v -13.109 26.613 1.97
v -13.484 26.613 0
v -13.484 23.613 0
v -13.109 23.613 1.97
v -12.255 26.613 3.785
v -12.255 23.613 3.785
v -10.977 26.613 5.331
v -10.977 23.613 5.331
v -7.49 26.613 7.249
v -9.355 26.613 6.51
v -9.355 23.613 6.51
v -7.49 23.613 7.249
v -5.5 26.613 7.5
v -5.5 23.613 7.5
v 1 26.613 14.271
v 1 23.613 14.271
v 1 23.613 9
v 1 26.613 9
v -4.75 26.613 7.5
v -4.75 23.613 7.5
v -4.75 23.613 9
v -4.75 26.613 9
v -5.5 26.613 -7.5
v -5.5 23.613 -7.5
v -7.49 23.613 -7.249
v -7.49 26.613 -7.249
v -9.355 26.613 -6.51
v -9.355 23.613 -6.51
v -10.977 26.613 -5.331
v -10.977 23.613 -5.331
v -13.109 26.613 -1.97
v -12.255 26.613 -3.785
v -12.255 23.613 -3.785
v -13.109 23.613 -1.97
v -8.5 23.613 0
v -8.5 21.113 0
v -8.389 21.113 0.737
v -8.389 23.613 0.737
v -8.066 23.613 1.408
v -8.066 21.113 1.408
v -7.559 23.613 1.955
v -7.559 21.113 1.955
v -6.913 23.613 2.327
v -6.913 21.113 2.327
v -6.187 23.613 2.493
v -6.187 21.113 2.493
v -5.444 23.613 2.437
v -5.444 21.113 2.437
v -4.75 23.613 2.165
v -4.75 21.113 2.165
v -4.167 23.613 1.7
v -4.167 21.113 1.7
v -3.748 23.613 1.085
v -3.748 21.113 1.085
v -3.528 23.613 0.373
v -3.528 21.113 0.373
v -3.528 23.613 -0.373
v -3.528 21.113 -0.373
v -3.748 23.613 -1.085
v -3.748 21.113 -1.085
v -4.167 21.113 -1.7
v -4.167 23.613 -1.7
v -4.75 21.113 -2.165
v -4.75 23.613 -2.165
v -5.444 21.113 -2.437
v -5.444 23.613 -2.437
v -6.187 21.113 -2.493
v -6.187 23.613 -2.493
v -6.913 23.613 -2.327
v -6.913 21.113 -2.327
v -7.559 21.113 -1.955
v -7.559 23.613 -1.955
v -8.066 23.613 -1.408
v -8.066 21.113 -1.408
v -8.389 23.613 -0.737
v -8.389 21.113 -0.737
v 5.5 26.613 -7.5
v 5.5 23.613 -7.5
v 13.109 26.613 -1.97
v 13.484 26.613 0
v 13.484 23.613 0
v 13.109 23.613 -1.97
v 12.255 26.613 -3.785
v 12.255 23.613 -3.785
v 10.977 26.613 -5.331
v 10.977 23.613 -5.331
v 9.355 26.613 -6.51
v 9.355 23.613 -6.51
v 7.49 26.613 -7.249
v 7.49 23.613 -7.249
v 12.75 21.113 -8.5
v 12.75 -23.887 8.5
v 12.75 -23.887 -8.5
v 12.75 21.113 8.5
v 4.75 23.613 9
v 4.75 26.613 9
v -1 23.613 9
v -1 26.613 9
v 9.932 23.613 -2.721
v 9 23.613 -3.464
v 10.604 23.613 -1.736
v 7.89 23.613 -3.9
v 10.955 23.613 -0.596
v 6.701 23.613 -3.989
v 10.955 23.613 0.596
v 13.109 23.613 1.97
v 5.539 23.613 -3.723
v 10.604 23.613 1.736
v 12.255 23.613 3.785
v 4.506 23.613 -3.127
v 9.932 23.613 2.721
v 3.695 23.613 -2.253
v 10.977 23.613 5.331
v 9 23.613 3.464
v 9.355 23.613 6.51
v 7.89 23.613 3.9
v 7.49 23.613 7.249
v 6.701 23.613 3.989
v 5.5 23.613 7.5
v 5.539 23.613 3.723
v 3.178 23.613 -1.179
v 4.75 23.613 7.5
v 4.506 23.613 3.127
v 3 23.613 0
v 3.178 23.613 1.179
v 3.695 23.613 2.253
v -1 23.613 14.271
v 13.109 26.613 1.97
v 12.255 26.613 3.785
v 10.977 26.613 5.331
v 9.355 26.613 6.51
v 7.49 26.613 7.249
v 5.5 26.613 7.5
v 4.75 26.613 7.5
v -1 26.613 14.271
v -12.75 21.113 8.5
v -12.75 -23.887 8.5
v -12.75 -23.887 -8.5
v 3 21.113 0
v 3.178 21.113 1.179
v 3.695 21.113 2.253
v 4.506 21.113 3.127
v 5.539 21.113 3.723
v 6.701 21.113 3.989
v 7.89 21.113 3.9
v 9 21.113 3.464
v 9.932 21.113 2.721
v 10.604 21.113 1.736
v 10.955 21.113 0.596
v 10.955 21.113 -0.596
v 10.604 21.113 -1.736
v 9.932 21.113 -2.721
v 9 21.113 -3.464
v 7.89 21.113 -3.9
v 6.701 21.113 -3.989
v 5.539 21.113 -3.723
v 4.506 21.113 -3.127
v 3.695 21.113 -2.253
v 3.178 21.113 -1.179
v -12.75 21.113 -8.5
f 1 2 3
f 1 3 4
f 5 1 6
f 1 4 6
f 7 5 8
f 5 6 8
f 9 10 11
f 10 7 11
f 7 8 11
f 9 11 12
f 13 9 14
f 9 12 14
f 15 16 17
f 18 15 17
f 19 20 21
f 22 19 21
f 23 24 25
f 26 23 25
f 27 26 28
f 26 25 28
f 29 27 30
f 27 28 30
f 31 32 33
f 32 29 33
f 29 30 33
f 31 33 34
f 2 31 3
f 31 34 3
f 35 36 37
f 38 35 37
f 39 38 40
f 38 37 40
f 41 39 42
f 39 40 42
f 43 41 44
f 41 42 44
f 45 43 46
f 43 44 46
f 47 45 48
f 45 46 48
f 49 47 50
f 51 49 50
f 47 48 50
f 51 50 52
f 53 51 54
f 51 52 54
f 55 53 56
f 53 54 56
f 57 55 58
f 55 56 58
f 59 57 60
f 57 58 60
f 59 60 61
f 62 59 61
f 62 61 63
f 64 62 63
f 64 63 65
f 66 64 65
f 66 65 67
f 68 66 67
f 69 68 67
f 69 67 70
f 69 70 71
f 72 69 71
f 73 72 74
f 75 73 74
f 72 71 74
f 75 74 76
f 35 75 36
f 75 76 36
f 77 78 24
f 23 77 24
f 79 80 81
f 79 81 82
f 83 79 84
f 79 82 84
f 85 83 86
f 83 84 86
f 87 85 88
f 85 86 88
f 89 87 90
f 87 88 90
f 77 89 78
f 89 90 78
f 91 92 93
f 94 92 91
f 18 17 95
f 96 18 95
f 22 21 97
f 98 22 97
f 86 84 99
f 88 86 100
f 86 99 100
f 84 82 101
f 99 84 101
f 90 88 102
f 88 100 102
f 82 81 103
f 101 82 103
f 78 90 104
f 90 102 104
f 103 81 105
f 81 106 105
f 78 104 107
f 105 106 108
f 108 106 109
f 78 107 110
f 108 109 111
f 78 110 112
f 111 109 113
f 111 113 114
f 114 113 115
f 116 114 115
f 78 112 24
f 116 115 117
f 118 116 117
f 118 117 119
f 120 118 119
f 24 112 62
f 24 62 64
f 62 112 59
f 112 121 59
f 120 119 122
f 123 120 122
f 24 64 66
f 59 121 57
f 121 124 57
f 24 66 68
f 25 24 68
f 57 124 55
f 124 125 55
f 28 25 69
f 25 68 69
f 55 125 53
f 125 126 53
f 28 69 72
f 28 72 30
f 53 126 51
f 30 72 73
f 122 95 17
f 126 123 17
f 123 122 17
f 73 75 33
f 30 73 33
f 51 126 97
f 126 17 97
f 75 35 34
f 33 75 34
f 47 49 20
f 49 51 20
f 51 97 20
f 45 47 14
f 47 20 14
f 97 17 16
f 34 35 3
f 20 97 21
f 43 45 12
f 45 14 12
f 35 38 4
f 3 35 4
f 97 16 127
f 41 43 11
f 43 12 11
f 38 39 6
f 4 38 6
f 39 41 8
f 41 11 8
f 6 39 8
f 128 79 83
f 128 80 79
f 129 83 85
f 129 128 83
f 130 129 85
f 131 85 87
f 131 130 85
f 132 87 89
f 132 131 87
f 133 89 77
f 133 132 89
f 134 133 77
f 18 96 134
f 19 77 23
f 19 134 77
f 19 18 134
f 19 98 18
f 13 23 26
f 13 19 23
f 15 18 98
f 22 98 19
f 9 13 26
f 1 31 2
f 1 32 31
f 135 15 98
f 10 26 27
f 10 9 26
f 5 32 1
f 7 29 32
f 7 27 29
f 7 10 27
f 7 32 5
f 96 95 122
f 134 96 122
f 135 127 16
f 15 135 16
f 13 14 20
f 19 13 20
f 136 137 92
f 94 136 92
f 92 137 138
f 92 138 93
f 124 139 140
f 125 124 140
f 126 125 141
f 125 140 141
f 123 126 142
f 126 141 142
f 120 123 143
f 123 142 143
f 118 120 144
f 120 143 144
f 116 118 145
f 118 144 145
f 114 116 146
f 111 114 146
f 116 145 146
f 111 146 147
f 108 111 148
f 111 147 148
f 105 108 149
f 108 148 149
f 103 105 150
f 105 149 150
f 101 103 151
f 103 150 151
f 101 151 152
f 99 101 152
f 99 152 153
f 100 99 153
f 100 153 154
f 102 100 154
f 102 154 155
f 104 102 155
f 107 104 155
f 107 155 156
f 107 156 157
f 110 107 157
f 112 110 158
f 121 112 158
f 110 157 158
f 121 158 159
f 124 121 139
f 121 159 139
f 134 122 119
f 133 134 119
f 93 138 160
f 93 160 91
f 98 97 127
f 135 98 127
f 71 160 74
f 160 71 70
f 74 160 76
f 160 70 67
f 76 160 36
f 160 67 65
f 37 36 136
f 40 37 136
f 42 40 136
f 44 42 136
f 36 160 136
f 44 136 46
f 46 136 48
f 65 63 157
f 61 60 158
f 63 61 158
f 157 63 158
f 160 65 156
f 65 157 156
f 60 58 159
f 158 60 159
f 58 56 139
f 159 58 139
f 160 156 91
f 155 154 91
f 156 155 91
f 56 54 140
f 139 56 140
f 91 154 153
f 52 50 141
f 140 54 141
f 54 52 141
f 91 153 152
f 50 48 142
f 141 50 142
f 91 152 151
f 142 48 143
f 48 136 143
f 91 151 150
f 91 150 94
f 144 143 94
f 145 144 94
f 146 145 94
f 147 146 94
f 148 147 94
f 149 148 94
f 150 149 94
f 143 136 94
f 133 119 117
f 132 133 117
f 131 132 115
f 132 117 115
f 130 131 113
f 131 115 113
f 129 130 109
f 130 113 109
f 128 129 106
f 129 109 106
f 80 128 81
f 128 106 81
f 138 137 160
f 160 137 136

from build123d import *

# Parameters (mm, degrees)
F0_W         = 25.5
F0_H         = 45
F1_DEPTH     = 8.5
F2_R         = 2.5
F2_R_2       = 4
F3_DEPTH     = 2.5
F5_DEPTH     = 3
F6_T4_DEPTH  = 43
F6_T9_DEPTH  = 43
F6_T14_DEPTH = 43
F6_T19_DEPTH = 43


# Not quite as in the source:
# - a fillet or chamfer that OpenCascade refuses, or shapes differently, is made with other operations: its cross-section is extruded or revolved along the edge and cut away or added


with BuildPart() as f1:
    # F0 (on Top) → F1 (new body, symmetric)
    with BuildSketch(Plane.XY):
        with Locations((0, -1.3867942244)):
            Rectangle(F0_W, F0_H)
    extrude(amount=F1_DEPTH, both=True)

    # F2 (on face) → F3 (join)
    with BuildSketch(Plane(origin=(0, 21.1132057756, 0), x_dir=(-1, 0, 0), z_dir=(0, 1, 0))):
        with Locations((6, 0)):
            Circle(F2_R)
        with Locations((-7, 0)):
            Circle(F2_R_2)
    extrude(amount=F3_DEPTH)

    # F4 (on face) → F5 (join)
    with BuildSketch(Plane(origin=(0, 23.6132057756, 0), x_dir=(-1, 0, 0), z_dir=(0, 1, 0))):
        Polygon((-4.75, 7.5), (-13.5, 7.5), (-13.5, -7.5), (13.5, -7.5), (13.5, 7.5), (4.75, 7.5), (4.75, 9), (1, 9), (1, 14.2706949264), (-1, 14.2706949264), (-1, 9), (-4.75, 9), align=None)
    extrude(amount=F5_DEPTH)

    # F6: fillet of radius 8 on 4 edges, made by hand


with BuildPart() as f6_tool2:
    # F6_s3 → F6_t4 (new body)
    with BuildSketch(Plane.XZ.offset(-3.6132057756)):
        with BuildLine():
            ThreePointArc((5.5, 7.5), (11.1568542495, 5.1568542495), (13.5, -0.5))
            Line((13.5, -0.5), (13.5, 7.5))
            Line((13.5, 7.5), (5.5, 7.5))
        make_face()
    extrude(amount=-F6_T4_DEPTH)

    split(bisect_by=Plane.XZ.offset(-21.1132057756), keep=Keep.BOTTOM)


with BuildPart() as f1_1:
    add(f1.part)

    # F6_t1: cut F6_tool2
    add(f6_tool2.part, mode=Mode.SUBTRACT)


with BuildPart() as f6_tool7:
    # F6_s8 → F6_t9 (new body)
    with BuildSketch(Plane.XZ.offset(-3.6132057756)):
        with BuildLine():
            ThreePointArc((-13.5, -0.5), (-11.1568542495, 5.1568542495), (-5.5, 7.5))
            Line((-5.5, 7.5), (-13.5, 7.5))
            Line((-13.5, 7.5), (-13.5, -0.5))
        make_face()
    extrude(amount=-F6_T9_DEPTH)

    split(bisect_by=Plane.XZ.offset(-21.1132057756), keep=Keep.BOTTOM)


with BuildPart() as f1_2:
    add(f1_1.part)

    # F6_t6: cut F6_tool7
    add(f6_tool7.part, mode=Mode.SUBTRACT)


with BuildPart() as f6_tool12:
    # F6_s13 → F6_t14 (new body)
    with BuildSketch(Plane.XZ.offset(-3.6132057756)):
        with BuildLine():
            ThreePointArc((-5.5, -7.5), (-11.1568542495, -5.1568542495), (-13.5, 0.5))
            Line((-13.5, 0.5), (-13.5, -7.5))
            Line((-13.5, -7.5), (-5.5, -7.5))
        make_face()
    extrude(amount=-F6_T14_DEPTH)

    split(bisect_by=Plane.XZ.offset(-21.1132057756), keep=Keep.BOTTOM)


with BuildPart() as f1_3:
    add(f1_2.part)

    # F6_t11: cut F6_tool12
    add(f6_tool12.part, mode=Mode.SUBTRACT)


with BuildPart() as f6_tool17:
    # F6_s18 → F6_t19 (new body)
    with BuildSketch(Plane.XZ.offset(-3.6132057756)):
        with BuildLine():
            ThreePointArc((13.5, 0.5), (11.1568542495, -5.1568542495), (5.5, -7.5))
            Line((5.5, -7.5), (13.5, -7.5))
            Line((13.5, -7.5), (13.5, 0.5))
        make_face()
    extrude(amount=-F6_T19_DEPTH)

    split(bisect_by=Plane.XZ.offset(-21.1132057756), keep=Keep.BOTTOM)


with BuildPart() as f1_4:
    add(f1_3.part)

    # F6_t16: cut F6_tool17
    add(f6_tool17.part, mode=Mode.SUBTRACT)


solid = f1_4.part
